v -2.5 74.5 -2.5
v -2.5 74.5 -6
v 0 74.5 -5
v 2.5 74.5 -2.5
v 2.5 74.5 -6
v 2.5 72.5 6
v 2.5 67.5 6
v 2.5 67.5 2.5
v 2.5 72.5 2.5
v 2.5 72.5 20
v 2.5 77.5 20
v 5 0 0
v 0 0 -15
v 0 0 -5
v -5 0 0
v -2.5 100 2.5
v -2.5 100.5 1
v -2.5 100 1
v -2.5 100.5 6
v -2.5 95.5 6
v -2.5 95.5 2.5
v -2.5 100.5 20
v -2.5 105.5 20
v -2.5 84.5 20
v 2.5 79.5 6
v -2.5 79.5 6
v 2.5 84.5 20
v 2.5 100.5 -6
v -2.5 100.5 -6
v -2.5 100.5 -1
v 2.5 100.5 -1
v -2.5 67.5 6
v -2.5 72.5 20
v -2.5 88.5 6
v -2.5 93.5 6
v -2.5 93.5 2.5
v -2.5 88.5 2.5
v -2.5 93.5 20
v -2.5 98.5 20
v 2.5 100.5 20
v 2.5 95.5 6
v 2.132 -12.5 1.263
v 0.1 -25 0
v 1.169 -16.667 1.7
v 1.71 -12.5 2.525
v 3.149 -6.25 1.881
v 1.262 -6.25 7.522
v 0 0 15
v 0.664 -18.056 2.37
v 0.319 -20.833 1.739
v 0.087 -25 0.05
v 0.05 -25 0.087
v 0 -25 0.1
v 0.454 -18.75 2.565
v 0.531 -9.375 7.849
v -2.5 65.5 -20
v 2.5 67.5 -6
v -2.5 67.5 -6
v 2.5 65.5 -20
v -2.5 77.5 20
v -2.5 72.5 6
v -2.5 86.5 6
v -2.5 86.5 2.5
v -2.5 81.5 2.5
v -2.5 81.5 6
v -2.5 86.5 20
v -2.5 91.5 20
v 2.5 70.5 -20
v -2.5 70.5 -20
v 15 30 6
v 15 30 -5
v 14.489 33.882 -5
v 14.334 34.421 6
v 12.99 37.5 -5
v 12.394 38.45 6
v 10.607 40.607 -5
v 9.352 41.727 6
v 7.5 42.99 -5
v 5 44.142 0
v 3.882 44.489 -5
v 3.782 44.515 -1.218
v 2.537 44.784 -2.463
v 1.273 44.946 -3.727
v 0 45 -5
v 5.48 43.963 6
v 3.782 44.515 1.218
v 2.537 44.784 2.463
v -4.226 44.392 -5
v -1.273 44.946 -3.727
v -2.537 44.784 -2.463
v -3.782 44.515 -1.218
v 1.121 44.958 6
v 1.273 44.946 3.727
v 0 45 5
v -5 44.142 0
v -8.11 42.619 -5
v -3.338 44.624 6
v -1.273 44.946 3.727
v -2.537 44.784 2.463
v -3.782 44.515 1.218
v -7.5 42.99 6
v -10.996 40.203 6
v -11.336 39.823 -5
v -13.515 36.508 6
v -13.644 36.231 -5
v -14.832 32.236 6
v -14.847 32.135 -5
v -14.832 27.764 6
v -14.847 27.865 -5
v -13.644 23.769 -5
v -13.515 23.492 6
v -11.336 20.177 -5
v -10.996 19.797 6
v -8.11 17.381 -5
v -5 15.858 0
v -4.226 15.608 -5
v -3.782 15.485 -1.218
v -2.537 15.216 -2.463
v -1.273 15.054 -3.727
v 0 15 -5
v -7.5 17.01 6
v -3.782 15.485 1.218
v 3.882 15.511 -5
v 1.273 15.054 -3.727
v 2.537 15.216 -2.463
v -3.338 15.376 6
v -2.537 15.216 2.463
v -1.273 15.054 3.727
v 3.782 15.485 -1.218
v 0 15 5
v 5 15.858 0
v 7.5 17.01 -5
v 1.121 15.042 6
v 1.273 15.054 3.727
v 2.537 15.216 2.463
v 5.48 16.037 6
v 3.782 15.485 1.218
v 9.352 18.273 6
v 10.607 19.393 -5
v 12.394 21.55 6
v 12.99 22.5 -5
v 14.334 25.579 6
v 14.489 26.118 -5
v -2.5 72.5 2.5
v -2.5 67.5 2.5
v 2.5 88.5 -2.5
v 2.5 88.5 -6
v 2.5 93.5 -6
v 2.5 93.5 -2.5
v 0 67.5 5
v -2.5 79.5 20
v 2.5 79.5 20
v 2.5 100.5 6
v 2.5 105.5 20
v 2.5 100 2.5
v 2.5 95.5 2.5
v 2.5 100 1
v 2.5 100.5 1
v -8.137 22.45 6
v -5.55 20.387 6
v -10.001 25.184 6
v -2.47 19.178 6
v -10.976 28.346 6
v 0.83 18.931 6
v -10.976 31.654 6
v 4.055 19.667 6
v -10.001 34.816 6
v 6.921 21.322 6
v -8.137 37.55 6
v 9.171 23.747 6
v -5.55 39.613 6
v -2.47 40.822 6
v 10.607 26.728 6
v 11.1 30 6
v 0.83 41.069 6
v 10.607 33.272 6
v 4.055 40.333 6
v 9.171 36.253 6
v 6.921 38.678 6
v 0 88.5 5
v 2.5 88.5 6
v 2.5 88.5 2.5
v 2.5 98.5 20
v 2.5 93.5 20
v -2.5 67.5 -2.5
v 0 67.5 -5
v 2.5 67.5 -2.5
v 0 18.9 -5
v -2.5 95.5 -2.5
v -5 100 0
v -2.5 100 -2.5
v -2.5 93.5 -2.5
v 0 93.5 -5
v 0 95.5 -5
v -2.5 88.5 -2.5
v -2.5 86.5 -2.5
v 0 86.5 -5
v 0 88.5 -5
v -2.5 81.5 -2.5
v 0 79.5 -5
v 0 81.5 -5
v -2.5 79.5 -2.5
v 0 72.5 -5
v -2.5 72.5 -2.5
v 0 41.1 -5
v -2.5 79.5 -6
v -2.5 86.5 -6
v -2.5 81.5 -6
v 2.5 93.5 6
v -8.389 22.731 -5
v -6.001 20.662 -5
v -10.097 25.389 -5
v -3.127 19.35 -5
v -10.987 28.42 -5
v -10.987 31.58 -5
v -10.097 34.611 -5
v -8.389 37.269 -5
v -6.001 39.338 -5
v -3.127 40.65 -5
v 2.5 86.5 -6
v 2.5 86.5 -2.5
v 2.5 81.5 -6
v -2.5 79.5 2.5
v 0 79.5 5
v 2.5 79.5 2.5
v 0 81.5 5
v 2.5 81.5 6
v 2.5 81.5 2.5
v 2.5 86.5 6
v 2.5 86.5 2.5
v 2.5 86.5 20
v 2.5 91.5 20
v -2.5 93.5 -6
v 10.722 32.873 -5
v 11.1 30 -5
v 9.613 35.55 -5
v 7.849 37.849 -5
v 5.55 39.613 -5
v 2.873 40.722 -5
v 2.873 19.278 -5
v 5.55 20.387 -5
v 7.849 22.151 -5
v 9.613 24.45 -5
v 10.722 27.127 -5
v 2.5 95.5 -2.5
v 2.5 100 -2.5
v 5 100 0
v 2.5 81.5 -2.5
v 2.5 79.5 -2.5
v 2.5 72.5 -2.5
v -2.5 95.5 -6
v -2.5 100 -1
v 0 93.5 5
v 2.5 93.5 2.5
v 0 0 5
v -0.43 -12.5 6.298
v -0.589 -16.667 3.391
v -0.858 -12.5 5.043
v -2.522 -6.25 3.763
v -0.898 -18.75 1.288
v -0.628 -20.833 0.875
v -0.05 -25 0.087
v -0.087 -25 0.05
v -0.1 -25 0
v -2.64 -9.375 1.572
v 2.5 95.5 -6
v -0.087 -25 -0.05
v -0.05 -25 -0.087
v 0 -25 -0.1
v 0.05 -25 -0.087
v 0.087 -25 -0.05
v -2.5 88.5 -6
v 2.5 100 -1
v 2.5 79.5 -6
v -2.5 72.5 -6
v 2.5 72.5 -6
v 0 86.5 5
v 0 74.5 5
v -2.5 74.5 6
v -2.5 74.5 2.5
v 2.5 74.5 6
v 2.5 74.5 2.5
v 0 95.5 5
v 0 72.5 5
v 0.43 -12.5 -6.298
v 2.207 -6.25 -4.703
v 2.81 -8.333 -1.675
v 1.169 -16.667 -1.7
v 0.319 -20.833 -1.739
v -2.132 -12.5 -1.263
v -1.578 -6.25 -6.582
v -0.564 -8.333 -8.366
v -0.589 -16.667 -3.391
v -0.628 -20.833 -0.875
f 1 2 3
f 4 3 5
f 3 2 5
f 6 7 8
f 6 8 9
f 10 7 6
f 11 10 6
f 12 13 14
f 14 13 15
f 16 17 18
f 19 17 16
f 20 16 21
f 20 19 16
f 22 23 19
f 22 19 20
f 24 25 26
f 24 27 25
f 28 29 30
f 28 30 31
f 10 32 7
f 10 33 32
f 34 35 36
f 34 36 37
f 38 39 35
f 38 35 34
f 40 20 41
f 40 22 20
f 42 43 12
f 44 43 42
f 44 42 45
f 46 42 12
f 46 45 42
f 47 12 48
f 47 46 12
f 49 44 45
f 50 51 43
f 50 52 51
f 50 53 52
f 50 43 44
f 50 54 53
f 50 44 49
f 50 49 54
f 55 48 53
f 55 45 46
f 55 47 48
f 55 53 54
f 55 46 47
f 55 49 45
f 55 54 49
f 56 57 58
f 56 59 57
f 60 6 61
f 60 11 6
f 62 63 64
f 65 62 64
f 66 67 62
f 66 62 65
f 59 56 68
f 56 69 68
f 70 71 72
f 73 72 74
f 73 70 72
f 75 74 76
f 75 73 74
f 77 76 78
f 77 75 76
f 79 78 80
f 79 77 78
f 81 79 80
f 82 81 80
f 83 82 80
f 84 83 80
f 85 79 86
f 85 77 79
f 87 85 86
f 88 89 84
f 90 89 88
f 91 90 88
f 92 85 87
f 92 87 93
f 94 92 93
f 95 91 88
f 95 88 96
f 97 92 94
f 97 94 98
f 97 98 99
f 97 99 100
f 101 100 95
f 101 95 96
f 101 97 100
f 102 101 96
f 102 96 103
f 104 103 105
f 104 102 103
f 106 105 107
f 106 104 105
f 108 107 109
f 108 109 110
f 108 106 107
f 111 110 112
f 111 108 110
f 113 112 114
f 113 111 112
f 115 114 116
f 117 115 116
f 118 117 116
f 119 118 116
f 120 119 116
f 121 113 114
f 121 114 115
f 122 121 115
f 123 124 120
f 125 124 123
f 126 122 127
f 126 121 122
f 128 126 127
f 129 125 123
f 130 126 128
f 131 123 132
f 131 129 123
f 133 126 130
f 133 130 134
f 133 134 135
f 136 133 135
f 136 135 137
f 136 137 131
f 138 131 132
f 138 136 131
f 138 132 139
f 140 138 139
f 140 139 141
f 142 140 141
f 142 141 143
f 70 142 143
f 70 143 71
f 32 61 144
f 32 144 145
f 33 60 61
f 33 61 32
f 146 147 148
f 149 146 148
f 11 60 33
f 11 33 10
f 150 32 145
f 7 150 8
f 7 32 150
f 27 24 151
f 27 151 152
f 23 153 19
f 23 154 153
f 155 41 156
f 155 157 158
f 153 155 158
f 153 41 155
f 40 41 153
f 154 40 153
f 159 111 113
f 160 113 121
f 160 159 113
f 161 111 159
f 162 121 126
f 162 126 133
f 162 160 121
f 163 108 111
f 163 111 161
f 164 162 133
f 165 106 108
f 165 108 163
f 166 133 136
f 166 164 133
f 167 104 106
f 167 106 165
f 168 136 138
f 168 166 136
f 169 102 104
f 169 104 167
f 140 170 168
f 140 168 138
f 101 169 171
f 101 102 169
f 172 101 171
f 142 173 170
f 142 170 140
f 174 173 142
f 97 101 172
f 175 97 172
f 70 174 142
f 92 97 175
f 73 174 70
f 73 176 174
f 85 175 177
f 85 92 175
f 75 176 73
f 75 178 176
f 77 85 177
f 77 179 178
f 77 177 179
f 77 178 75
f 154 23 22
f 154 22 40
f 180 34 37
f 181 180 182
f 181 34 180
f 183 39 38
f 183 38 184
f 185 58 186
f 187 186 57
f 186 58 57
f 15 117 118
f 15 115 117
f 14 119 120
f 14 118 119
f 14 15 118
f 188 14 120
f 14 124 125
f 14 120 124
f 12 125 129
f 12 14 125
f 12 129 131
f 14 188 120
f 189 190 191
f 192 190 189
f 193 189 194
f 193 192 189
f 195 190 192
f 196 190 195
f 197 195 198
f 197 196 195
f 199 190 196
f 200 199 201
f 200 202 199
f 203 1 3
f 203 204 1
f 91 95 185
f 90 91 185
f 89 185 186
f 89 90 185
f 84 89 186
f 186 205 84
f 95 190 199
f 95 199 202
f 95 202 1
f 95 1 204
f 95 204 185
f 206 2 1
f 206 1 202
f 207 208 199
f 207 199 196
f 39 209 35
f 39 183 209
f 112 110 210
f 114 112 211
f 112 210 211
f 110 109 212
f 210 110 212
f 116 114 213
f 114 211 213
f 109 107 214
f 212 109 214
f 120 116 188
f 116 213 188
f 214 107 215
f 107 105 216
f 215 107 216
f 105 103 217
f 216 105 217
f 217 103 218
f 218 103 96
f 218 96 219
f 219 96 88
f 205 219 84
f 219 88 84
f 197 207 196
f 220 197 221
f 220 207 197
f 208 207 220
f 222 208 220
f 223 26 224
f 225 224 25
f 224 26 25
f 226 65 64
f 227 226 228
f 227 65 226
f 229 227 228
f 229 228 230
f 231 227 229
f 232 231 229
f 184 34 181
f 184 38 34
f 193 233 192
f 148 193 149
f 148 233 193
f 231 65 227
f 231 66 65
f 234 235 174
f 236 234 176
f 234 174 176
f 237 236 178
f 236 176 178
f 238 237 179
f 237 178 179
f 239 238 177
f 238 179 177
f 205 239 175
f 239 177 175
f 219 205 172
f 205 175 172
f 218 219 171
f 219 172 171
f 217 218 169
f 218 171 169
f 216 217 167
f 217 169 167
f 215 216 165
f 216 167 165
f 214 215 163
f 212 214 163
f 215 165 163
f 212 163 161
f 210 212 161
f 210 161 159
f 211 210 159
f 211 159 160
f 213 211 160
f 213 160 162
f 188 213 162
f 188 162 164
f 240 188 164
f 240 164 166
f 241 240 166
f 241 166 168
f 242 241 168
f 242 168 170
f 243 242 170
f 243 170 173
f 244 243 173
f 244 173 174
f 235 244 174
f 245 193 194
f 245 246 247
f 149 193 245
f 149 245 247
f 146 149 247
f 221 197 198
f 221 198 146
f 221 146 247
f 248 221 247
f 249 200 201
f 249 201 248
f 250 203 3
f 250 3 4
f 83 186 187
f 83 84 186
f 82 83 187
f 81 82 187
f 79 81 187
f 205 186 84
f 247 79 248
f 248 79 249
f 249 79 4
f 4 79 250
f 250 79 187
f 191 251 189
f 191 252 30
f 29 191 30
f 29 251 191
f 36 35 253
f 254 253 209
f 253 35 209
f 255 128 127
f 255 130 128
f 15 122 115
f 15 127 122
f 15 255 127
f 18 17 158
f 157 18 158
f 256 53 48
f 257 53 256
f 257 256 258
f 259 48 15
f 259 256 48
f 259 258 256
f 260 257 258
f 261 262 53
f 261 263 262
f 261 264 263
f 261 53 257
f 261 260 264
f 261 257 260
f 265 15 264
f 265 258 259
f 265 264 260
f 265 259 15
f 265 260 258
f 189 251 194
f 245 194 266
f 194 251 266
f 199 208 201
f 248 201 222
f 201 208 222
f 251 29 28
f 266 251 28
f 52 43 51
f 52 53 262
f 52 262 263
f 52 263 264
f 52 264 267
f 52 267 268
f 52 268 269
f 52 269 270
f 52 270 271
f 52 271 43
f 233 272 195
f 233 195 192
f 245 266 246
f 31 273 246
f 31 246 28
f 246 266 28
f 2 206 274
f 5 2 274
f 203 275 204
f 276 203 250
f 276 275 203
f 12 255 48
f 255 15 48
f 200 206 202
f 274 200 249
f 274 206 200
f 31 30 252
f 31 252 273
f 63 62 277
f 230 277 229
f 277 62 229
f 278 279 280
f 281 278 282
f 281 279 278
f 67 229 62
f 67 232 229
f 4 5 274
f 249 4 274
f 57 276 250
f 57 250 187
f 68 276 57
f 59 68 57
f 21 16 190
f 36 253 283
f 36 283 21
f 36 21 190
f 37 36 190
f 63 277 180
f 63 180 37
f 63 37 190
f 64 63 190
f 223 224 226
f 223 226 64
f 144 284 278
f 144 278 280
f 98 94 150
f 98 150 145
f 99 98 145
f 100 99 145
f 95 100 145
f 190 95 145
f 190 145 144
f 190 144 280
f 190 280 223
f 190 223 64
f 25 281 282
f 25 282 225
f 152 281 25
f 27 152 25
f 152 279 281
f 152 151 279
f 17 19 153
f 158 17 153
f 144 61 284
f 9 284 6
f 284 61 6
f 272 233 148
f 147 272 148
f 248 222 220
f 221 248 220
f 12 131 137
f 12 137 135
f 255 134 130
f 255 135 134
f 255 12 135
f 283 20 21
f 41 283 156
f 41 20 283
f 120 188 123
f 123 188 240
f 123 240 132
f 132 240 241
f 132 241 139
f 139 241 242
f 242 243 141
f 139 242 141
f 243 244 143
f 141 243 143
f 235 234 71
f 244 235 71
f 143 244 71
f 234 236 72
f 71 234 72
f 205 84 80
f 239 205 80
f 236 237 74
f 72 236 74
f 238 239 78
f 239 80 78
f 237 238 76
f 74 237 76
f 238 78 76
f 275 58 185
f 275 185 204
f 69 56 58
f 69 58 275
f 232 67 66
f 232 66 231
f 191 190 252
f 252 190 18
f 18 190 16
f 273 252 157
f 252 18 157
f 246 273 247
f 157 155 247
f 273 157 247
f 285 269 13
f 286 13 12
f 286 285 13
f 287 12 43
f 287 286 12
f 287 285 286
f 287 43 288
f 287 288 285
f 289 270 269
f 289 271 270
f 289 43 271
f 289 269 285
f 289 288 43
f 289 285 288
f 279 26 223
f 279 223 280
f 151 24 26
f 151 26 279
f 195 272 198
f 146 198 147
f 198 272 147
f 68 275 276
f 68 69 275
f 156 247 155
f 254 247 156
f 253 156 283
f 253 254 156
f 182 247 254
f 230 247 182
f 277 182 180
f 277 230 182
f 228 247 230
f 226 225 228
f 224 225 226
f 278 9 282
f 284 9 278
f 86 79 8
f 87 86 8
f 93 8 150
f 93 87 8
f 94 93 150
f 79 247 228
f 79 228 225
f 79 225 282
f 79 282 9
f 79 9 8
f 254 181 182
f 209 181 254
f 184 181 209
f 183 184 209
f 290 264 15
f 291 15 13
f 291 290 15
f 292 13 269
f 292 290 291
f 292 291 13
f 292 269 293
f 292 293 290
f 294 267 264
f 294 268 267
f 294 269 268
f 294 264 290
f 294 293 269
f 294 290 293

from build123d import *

# Parameters (mm, degrees)
F2_R       = 0.1
F5_DEPTH   = 100
F7_R       = 15
F7_R_2     = 11
F8_DEPTH   = 11
F9_R       = 11.1
F10_DEPTH  = 21.001
F11_W      = 5
F11_H      = 5
F14_DEPTH  = 5
F14_FACE_W = 5
F14_FACE_H = 5
F13_W      = 5
F13_H      = 5
F21_W      = 5
F21_H      = 5
F22_DEPTH  = 5
F22_FACE_W = 5
F22_FACE_H = 5
F24_W      = 5
F24_H      = 5


with BuildPart() as f3:
    # F0 (on Front) → F3 section 0
    with BuildSketch(Plane.XZ):
        Polygon((5, 0), (0, 15), (-5, 0), (0, -15), align=None)
    # F2 (on offset) → F3 section 1
    with BuildSketch(Plane.XZ.offset(25)):
        Circle(F2_R)
    loft()

    # F4 (on Front) → F5 (join)
    with BuildSketch(Plane.XZ):
        Polygon((2e-06, 5.000002), (-5, 0), (2e-06, -5.000002), (5.000005, 0), align=None)
    extrude(amount=-F5_DEPTH)

    # F7 (on offset) → F8 (join)
    with BuildSketch(Plane.XY.offset(6)):
        with Locations((0, 30)):
            Circle(F7_R)
        with Locations((0, 30)):
            Circle(F7_R_2, mode=Mode.SUBTRACT)
    extrude(amount=-F8_DEPTH)

    # F9 (on offset) → F10 (cut, through all)
    with BuildSketch(Plane.XY.offset(6)):
        with Locations((0, 30)):
            Circle(F9_R)
    extrude(amount=-F10_DEPTH, mode=Mode.SUBTRACT)

    # F11 (on offset) → F14 (join)
    with BuildSketch(Plane.XY.offset(6)):
        with Locations((0, 70)):
            Rectangle(F11_W, F11_H)
        with Locations((0, 77)):
            Rectangle(F11_W, F11_H)
        with Locations((0, 84)):
            Rectangle(F11_W, F11_H)
        with Locations((0, 91)):
            Rectangle(F11_W, F11_H)
        with Locations((0, 98)):
            Rectangle(F11_W, F11_H)
    extrude(amount=-F14_DEPTH)

    # F14_face (on face) → F15 section 0
    with BuildSketch(Plane(origin=(0, 70, 6), x_dir=(1, 0, 0), z_dir=(0, 0, 1))):
        Rectangle(F14_FACE_W, F14_FACE_H)
    # F13 (on offset) → F15 section 1
    with BuildSketch(Plane.XY.offset(20)):
        with Locations((0, 75)):
            Rectangle(F13_W, F13_H)
    loft()

    # F14_face (on face) → F16 section 0
    with BuildSketch(Plane(origin=(0, 70, 6), x_dir=(1, 0, 0), z_dir=(0, 0, 1))):
        with Locations((0, 7)):
            Rectangle(F14_FACE_W, F14_FACE_H)
    # F13 (on offset) → F16 section 1
    with BuildSketch(Plane.XY.offset(20)):
        with Locations((0, 82)):
            Rectangle(F13_W, F13_H)
    loft()

    # F14_face (on face) → F17 section 0
    with BuildSketch(Plane(origin=(0, 70, 6), x_dir=(1, 0, 0), z_dir=(0, 0, 1))):
        with Locations((0, 14)):
            Rectangle(F14_FACE_W, F14_FACE_H)
    # F13 (on offset) → F17 section 1
    with BuildSketch(Plane.XY.offset(20)):
        with Locations((0, 89)):
            Rectangle(F13_W, F13_H)
    loft()

    # F14_face (on face) → F18 section 0
    with BuildSketch(Plane(origin=(0, 70, 6), x_dir=(1, 0, 0), z_dir=(0, 0, 1))):
        with Locations((0, 21)):
            Rectangle(F14_FACE_W, F14_FACE_H)
    # F13 (on offset) → F18 section 1
    with BuildSketch(Plane.XY.offset(20)):
        with Locations((0, 96)):
            Rectangle(F13_W, F13_H)
    loft()

    # F14_face (on face) → F19 section 0
    with BuildSketch(Plane(origin=(0, 70, 6), x_dir=(1, 0, 0), z_dir=(0, 0, 1))):
        with Locations((0, 28)):
            Rectangle(F14_FACE_W, F14_FACE_H)
    # F13 (on offset) → F19 section 1
    with BuildSketch(Plane.XY.offset(20)):
        with Locations((0, 103)):
            Rectangle(F13_W, F13_H)
    loft()

    # F21 (on offset) → F22 (join)
    with BuildSketch(Plane.XY.offset(-6)):
        with Locations((0, 70)):
            Rectangle(F21_W, F21_H)
        with Locations((0, 77)):
            Rectangle(F21_W, F21_H)
        with Locations((0, 84)):
            Rectangle(F21_W, F21_H)
        with Locations((0, 91)):
            Rectangle(F21_W, F21_H)
        with Locations((0, 98)):
            Rectangle(F21_W, F21_H)
    extrude(amount=F22_DEPTH)

    # F22_face (on face) → F25 section 0
    with BuildSketch(Plane(origin=(0, 70, -6), x_dir=(1, 0, 0), z_dir=(0, 0, -1))):
        Rectangle(F22_FACE_W, F22_FACE_H)
    # F24 (on offset) → F25 section 1
    with BuildSketch(Plane.XY.offset(-20)):
        with Locations((0, 68)):
            Rectangle(F24_W, F24_H)
    loft()


solid = f3.part
